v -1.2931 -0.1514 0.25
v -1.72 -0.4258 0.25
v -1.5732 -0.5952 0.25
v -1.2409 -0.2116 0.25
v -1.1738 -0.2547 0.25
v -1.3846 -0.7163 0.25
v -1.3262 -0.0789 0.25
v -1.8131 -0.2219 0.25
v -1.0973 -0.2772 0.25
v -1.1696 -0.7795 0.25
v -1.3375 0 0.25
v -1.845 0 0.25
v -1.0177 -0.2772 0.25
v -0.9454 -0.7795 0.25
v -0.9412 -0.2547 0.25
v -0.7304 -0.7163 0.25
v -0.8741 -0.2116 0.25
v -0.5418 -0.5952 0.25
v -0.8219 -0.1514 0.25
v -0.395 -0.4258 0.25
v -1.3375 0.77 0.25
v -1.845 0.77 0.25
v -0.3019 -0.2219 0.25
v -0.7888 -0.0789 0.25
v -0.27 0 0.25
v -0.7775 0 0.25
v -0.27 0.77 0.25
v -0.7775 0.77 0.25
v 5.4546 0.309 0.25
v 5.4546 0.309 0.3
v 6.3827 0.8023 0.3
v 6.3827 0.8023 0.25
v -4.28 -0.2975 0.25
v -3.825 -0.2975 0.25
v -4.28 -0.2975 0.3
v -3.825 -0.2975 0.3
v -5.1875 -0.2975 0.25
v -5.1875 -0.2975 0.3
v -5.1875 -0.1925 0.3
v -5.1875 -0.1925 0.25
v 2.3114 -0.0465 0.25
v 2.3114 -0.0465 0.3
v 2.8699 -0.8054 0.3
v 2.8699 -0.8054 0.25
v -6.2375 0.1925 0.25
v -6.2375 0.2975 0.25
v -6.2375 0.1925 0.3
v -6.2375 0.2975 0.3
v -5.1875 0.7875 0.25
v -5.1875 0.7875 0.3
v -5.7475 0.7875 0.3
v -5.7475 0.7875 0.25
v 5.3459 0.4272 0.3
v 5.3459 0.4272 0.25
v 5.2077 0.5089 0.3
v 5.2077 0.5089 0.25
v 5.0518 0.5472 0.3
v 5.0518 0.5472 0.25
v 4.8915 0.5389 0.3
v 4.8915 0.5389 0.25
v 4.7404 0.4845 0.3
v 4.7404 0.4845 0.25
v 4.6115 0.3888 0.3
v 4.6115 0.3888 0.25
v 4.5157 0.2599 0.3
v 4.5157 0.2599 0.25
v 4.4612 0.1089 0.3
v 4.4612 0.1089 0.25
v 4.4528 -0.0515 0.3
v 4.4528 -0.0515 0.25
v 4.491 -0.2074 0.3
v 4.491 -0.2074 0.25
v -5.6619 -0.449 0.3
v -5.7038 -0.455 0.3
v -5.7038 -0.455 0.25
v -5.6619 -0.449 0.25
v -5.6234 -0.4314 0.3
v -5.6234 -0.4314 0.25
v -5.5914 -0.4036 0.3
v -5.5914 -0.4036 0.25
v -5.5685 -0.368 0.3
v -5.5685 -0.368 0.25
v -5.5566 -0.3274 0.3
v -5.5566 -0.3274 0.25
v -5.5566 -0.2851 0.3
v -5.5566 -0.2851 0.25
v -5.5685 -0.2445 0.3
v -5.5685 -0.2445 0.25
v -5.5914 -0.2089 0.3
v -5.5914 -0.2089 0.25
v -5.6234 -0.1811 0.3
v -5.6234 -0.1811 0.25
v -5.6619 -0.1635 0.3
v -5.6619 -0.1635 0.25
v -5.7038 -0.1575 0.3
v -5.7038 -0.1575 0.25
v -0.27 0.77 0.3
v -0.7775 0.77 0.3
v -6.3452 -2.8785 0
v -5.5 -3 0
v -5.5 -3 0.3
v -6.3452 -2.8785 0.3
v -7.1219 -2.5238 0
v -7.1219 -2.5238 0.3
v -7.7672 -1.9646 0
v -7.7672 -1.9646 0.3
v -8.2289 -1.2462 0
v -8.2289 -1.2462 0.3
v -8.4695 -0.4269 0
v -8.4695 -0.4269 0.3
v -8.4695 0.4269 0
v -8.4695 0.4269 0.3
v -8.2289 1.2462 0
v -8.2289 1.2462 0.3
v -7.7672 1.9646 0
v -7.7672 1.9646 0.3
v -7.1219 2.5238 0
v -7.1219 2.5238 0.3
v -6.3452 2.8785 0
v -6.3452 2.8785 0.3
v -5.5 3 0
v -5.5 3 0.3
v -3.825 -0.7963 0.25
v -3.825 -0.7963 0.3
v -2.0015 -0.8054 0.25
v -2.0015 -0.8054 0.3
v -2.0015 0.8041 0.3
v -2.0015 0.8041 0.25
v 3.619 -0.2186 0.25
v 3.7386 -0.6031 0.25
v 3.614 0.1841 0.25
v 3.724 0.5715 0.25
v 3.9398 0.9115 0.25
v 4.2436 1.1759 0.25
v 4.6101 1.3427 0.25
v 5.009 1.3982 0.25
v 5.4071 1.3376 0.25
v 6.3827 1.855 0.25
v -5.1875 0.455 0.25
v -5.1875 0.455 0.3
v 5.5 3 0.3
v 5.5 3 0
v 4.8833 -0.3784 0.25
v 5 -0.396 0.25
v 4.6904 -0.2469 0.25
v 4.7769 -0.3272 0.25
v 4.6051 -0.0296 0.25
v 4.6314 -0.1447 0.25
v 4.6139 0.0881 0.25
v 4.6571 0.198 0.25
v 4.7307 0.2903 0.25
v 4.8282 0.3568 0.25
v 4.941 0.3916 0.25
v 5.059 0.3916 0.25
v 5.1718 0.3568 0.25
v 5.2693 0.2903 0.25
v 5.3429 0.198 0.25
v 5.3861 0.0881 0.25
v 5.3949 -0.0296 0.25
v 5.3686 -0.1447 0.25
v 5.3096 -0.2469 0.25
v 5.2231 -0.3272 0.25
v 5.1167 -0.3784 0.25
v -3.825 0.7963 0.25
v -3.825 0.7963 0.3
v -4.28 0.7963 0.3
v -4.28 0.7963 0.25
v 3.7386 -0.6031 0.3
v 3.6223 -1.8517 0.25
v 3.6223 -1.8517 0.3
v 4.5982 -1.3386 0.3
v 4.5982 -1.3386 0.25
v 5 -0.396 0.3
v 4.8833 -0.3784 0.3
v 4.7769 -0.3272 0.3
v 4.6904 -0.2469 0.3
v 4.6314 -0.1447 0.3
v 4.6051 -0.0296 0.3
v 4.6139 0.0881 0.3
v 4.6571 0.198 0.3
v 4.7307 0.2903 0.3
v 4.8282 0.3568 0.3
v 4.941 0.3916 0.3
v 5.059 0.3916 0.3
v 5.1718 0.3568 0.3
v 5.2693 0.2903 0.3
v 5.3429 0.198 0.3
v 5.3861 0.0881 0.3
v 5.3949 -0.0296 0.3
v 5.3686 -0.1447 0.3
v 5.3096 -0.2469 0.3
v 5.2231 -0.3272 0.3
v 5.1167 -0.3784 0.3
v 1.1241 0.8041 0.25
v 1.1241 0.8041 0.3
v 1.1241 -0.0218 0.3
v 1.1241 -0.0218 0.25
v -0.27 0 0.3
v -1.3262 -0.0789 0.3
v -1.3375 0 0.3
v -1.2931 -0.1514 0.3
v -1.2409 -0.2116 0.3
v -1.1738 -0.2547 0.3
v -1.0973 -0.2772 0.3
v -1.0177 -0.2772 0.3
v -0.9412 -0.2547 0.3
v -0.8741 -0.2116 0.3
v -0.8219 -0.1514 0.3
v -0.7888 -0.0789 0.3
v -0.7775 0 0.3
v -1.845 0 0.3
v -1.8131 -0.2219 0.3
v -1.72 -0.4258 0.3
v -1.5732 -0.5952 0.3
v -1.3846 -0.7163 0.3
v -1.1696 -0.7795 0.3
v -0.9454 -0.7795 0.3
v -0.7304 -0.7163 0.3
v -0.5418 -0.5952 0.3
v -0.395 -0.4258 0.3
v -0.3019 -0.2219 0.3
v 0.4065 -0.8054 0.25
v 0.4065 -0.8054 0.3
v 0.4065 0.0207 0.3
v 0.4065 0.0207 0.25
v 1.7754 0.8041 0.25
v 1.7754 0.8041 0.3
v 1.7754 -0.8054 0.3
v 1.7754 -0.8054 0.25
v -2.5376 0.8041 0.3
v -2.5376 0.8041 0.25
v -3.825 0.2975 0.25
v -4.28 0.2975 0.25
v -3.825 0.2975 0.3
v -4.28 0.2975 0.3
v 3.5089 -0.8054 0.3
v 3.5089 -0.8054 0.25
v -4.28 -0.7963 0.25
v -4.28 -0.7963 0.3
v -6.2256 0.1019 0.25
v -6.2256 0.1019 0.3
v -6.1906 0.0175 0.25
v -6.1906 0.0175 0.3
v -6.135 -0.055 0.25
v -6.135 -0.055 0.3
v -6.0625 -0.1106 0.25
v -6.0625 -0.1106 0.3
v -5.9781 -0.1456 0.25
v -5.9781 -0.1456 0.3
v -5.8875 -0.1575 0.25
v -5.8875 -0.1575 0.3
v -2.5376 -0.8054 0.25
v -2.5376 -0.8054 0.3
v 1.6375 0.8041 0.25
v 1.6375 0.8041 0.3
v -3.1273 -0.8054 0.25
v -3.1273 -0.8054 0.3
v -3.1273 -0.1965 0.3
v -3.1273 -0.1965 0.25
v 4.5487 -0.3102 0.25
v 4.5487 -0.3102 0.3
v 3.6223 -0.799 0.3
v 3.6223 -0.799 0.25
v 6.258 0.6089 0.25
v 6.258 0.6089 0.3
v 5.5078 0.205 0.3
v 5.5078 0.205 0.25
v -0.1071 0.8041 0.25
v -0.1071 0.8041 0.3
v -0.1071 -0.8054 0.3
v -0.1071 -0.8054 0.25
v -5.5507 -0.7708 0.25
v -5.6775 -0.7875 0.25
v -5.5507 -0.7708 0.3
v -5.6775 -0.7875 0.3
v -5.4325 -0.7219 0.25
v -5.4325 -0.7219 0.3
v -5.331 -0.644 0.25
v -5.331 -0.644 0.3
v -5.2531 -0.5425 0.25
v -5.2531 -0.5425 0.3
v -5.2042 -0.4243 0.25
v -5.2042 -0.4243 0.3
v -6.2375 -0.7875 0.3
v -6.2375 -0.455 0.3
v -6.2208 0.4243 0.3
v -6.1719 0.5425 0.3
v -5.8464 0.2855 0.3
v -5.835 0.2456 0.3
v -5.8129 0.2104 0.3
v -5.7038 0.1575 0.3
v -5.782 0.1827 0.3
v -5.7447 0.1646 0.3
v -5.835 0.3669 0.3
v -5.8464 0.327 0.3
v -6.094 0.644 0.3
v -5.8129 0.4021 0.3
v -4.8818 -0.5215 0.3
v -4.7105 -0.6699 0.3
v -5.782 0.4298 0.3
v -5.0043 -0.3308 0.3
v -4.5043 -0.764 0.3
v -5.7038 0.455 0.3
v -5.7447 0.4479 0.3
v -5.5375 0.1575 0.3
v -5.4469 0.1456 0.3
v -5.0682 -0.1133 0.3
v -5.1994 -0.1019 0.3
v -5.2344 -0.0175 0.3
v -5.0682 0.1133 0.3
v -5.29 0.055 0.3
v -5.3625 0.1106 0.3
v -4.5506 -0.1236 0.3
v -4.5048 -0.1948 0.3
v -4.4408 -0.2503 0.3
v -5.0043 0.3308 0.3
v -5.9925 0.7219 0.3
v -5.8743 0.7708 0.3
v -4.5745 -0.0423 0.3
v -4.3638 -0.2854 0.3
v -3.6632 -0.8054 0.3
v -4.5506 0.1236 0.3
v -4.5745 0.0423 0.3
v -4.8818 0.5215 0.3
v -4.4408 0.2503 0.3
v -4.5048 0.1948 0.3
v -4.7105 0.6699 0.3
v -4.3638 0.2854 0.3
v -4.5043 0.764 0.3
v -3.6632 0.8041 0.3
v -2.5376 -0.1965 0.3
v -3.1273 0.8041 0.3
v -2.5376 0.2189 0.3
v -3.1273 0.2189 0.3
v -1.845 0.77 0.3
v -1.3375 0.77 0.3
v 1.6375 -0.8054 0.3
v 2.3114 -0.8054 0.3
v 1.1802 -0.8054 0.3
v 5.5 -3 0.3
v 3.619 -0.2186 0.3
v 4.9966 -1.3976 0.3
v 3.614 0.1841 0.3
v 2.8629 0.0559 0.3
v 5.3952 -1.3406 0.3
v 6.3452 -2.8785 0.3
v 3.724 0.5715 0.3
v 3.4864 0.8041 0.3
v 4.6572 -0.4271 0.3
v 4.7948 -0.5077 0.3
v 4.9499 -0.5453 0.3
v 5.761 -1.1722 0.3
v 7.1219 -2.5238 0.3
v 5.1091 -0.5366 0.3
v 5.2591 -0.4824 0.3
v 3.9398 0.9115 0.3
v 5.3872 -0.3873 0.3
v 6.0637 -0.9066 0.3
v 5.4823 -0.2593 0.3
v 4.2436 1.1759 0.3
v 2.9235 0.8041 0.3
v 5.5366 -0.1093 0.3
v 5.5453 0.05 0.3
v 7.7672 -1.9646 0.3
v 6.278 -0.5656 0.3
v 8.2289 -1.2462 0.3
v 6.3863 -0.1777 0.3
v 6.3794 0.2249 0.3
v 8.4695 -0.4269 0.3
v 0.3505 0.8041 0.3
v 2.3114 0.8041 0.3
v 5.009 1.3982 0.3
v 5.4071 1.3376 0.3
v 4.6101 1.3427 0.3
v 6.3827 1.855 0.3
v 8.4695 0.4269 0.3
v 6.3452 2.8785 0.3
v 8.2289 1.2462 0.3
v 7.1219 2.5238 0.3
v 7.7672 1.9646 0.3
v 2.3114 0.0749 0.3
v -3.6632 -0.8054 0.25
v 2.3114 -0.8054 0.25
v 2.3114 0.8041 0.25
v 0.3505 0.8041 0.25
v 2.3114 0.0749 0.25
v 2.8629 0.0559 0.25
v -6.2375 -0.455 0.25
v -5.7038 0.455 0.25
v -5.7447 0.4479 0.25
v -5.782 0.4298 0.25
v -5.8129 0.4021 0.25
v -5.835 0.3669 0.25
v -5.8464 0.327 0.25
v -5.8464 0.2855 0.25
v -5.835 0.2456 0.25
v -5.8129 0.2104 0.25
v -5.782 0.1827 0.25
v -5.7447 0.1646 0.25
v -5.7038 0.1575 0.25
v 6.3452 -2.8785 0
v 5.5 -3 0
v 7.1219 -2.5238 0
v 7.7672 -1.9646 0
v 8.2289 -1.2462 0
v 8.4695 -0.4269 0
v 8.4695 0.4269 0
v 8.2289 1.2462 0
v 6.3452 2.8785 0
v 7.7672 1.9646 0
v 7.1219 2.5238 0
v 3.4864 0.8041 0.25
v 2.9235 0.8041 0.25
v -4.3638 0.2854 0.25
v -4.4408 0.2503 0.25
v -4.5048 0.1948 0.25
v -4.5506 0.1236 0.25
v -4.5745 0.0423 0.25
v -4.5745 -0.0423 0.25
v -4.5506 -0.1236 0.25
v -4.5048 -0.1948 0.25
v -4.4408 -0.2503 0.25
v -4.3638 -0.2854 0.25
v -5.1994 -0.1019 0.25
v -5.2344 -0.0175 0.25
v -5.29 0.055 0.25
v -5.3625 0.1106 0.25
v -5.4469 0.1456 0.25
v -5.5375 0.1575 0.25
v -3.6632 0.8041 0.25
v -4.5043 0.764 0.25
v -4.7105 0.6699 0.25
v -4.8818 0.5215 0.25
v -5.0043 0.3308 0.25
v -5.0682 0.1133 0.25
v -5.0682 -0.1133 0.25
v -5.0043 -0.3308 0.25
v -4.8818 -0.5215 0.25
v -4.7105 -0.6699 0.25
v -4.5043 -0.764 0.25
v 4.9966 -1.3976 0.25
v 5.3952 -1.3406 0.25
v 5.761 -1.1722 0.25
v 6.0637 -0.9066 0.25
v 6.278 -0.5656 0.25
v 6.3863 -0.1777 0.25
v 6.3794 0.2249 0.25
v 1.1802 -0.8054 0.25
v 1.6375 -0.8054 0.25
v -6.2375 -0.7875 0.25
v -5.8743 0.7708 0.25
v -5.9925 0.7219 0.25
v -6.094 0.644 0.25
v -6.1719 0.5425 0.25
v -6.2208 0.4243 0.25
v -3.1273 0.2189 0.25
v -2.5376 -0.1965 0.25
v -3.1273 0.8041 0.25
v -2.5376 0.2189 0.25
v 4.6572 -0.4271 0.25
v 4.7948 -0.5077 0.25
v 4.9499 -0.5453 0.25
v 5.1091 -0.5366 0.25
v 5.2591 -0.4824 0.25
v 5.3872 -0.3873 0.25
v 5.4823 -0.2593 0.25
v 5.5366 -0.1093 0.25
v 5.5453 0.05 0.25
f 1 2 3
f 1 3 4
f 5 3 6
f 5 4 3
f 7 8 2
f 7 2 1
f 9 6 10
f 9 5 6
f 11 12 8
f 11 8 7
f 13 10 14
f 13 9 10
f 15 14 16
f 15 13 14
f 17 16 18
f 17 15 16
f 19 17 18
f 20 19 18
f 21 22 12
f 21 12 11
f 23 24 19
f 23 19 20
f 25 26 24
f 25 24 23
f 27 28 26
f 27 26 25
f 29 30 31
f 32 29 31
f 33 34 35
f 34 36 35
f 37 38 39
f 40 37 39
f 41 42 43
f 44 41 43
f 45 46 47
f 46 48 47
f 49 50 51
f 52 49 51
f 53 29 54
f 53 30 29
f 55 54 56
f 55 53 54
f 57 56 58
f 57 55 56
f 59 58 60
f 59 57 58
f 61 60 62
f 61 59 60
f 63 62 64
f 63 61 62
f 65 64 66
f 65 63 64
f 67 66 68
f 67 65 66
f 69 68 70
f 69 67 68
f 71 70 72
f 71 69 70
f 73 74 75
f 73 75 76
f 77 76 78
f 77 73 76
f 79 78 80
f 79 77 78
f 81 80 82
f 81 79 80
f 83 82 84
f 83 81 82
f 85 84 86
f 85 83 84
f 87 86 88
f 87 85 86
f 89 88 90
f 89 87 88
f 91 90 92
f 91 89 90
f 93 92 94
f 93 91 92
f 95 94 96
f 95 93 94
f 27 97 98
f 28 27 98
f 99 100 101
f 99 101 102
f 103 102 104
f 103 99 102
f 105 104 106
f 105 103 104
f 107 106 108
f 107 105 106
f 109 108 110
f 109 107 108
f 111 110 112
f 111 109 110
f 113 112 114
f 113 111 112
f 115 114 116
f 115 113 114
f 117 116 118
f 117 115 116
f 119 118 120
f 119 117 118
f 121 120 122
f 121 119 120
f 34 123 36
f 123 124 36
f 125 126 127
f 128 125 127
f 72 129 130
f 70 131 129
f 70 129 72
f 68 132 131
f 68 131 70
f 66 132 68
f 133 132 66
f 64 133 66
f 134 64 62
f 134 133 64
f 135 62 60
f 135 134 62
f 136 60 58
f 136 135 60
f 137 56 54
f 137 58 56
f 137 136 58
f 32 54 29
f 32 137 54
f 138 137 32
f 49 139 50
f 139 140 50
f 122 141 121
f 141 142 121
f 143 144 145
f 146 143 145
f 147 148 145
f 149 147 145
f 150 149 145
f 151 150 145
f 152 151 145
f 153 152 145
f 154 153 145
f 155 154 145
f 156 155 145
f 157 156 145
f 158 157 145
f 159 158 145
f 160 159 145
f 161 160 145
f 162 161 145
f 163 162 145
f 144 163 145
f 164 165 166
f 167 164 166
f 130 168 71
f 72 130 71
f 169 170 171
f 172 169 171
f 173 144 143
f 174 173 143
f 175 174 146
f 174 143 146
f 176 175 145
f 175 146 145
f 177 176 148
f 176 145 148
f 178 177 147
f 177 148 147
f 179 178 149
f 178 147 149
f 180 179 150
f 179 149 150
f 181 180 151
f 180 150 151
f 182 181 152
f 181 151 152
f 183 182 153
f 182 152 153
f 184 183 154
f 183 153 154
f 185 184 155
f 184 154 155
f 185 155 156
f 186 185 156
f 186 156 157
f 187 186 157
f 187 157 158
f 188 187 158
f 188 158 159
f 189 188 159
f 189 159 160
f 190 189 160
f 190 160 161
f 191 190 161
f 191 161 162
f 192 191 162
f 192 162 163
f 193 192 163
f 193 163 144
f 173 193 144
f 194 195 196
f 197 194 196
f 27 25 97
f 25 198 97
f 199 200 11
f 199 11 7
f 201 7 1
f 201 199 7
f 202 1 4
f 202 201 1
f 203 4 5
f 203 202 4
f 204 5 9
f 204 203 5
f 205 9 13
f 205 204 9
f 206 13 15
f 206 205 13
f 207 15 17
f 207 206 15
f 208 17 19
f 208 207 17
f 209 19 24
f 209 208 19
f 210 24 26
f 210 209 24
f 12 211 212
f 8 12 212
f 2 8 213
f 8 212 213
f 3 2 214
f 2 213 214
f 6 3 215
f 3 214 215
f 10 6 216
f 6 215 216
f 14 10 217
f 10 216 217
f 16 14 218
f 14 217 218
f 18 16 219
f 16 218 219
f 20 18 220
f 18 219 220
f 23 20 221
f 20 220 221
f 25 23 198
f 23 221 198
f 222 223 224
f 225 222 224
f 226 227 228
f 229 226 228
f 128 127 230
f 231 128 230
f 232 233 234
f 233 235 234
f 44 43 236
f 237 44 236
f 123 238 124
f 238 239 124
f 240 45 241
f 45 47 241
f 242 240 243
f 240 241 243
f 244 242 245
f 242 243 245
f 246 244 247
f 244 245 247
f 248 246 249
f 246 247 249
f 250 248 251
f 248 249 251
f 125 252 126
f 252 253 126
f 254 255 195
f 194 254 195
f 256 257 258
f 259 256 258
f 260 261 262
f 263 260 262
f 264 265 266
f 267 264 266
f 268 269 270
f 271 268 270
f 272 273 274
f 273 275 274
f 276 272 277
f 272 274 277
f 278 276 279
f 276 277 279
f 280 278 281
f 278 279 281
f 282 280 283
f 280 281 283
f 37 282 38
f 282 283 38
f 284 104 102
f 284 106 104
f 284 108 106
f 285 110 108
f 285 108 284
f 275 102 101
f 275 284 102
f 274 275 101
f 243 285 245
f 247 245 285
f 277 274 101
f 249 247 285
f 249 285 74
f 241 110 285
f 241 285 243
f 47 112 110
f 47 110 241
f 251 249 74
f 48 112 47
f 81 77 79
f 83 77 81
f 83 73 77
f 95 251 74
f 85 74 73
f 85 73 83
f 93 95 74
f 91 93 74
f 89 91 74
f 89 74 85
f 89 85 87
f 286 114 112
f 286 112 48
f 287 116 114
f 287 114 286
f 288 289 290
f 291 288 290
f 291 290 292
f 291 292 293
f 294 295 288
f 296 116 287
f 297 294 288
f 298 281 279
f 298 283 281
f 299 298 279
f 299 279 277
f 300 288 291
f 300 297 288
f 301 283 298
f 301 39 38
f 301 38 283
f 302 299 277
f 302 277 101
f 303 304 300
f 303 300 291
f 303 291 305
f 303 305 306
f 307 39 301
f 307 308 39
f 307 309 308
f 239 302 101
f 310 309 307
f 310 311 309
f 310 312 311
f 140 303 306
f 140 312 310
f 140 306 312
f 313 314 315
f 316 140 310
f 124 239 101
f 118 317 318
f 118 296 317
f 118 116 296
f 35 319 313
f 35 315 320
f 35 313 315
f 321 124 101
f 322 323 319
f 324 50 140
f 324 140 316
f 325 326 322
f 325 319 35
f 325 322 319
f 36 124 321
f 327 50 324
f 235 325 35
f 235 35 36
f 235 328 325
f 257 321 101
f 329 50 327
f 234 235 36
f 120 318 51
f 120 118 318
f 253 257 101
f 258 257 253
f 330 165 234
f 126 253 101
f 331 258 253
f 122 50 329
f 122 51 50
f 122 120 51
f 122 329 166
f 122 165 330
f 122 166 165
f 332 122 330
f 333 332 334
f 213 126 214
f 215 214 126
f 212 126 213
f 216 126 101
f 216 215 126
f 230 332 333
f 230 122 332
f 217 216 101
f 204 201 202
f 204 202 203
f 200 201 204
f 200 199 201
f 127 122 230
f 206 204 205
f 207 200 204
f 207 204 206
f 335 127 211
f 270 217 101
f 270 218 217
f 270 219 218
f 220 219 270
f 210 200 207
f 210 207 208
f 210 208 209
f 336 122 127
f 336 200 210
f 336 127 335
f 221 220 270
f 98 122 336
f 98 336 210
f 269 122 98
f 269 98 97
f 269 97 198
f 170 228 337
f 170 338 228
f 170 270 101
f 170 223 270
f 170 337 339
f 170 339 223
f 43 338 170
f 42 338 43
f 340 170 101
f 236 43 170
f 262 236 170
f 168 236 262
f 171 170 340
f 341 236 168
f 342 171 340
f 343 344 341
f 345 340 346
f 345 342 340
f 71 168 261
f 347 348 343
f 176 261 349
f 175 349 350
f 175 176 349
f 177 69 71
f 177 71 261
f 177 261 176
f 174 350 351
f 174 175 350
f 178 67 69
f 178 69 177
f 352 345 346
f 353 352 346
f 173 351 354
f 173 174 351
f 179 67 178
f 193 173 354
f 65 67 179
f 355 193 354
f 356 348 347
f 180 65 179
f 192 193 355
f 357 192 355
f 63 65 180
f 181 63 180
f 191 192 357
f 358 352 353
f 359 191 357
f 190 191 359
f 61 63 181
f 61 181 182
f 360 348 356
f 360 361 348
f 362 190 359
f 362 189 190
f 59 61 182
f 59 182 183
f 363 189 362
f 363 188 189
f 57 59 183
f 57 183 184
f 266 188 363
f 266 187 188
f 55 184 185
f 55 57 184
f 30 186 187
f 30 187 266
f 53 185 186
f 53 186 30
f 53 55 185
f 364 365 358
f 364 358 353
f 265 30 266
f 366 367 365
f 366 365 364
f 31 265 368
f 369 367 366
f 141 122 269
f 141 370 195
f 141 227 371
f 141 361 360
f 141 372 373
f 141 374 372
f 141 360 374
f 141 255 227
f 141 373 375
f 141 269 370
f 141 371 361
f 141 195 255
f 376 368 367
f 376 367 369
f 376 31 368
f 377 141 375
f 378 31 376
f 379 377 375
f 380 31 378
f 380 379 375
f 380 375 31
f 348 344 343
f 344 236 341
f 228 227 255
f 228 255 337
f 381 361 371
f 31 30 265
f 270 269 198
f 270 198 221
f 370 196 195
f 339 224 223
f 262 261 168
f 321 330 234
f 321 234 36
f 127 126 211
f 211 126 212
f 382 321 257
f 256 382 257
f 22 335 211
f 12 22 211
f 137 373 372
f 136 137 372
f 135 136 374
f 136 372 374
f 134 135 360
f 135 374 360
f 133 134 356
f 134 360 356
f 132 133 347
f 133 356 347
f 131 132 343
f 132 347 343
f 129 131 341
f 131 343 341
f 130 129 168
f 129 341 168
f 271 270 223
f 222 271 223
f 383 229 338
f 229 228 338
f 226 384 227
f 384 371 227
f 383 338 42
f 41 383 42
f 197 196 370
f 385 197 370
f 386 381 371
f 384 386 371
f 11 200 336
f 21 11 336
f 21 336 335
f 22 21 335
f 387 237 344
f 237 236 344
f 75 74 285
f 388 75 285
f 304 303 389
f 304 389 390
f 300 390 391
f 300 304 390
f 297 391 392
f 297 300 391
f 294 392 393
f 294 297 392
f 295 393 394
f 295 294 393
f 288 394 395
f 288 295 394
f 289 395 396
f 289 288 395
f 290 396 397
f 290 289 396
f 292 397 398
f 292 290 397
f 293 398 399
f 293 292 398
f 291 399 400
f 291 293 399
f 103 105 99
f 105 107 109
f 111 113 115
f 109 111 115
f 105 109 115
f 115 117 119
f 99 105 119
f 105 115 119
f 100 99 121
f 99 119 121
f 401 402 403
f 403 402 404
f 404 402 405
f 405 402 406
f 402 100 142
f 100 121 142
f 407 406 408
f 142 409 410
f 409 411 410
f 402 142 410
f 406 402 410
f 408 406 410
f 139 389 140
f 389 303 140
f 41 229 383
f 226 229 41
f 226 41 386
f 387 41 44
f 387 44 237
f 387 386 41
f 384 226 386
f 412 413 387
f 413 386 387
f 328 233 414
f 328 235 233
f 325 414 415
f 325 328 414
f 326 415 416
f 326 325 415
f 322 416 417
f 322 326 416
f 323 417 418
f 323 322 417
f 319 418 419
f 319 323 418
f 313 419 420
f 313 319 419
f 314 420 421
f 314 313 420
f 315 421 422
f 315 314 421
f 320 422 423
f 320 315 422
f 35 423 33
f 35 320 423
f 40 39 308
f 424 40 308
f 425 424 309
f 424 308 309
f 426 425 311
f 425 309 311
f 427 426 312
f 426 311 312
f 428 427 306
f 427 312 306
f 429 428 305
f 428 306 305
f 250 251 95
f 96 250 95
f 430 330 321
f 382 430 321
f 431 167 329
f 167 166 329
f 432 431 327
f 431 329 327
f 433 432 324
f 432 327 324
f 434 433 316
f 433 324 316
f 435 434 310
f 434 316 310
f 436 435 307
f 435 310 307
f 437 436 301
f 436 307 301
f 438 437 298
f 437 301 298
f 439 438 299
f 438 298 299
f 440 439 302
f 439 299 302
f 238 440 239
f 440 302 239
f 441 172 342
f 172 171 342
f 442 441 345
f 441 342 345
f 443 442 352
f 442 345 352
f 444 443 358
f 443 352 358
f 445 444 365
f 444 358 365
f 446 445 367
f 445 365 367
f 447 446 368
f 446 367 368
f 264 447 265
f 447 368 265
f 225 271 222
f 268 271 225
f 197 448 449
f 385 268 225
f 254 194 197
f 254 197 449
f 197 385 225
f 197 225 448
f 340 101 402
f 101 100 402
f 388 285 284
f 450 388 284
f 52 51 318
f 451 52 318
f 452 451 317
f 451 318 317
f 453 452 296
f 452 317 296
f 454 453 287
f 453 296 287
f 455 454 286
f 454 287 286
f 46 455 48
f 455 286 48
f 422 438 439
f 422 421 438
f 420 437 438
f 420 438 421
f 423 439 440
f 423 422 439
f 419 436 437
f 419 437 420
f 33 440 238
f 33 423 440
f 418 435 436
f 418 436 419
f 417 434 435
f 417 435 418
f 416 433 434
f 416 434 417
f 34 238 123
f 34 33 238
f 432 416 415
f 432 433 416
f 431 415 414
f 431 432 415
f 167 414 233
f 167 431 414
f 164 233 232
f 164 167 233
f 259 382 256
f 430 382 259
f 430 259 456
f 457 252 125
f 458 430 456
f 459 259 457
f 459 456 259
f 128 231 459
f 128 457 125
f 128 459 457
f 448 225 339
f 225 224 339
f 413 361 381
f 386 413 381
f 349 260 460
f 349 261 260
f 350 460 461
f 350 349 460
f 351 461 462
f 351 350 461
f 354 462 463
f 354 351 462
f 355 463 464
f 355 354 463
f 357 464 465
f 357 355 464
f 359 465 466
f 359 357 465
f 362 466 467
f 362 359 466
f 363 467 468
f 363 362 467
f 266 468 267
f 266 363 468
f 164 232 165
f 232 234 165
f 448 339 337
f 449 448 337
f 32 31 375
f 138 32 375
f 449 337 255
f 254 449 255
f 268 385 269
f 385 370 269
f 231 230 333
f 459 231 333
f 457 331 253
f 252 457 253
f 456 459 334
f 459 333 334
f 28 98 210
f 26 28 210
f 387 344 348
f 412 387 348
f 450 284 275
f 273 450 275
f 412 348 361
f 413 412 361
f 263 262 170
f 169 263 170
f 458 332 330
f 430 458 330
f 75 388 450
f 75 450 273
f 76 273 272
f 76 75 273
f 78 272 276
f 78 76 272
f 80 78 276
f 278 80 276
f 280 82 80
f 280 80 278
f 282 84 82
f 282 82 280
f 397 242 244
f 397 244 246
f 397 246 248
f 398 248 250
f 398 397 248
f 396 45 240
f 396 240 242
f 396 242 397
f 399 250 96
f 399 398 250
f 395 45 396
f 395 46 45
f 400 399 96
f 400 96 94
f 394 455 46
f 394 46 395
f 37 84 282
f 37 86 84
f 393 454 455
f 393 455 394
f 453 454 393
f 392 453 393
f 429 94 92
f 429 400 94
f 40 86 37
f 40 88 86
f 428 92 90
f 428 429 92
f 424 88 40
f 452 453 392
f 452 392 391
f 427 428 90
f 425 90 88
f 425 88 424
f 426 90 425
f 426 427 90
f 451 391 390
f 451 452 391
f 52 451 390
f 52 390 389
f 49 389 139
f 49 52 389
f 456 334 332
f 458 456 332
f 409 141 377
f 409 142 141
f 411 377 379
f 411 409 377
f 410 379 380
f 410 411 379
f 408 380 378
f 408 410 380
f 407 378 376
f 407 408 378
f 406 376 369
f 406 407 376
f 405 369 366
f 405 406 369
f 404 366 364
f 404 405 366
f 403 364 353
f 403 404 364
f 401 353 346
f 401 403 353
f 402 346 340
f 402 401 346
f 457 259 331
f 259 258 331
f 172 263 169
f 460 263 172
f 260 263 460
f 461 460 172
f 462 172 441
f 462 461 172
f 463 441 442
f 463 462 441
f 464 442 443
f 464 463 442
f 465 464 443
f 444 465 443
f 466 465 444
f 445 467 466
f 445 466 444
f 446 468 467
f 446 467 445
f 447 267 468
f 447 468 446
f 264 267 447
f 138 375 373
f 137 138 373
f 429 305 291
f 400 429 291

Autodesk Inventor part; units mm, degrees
sketch "Sketch_1" plane through (0, 0, 0) normal (0, 0, 1) x (1, 0, 0)
  arc A0 (-8.5, 0) -> (-5.5, -3) centre (-5.5, 0) ccw
  line L0 (-5.5, -3) -> (5.5, -3)
  arc A1 (5.5, -3) -> (8.5, 0) centre (5.5, 0) ccw
  arc A2 (8.5, 0) -> (5.5, 3) centre (5.5, 0) ccw
  line L1 (5.5, 3) -> (-5.5, 3)
  arc A3 (-5.5, 3) -> (-8.5, 0) centre (-5.5, 0) ccw
extrude "Extrusion1" add sketch "Sketch_1" along normal blind 0.3
sketch "Sketch_13" plane through (0, 0, 0.3) normal (0, 0, 1) x (1, 0, 0)
  line L0 (-3.6632, 0.8041) -> (-3.6632, -0.8054)
  line L1 (-3.6632, -0.8054) -> (-3.1273, -0.8054)
  line L2 (-3.1273, -0.8054) -> (-3.1273, -0.1965)
  line L3 (-3.1273, -0.1965) -> (-2.5376, -0.1965)
  line L4 (-2.5376, -0.1965) -> (-2.5376, -0.8054)
  line L5 (-2.5376, -0.8054) -> (-2.0015, -0.8054)
  line L6 (-2.0015, -0.8054) -> (-2.0015, 0.8041)
  line L7 (-2.0015, 0.8041) -> (-2.5376, 0.8041)
  line L8 (-2.5376, 0.8041) -> (-2.5376, 0.2189)
  line L9 (-2.5376, 0.2189) -> (-3.1273, 0.2189)
  line L10 (-3.1273, 0.2189) -> (-3.1273, 0.8041)
  line L11 (-3.1273, 0.8041) -> (-3.6632, 0.8041)
extrude "Extrusion2" cut sketch "Sketch_13" against normal blind 0.05
sketch "Sketch_15" plane through (0, 0, 0.3) normal (0, 0, 1) x (1, 0, 0)
  line L0 (-0.1071, 0.8041) -> (-0.1071, -0.8054)
  line L1 (-0.1071, -0.8054) -> (0.4065, -0.8054)
  line L2 (0.4065, -0.8054) -> (0.4065, 0.0207)
  line L3 (0.4065, 0.0207) -> (1.1802, -0.8054)
  line L4 (1.1802, -0.8054) -> (1.6375, -0.8054)
  line L5 (1.6375, -0.8054) -> (1.6375, 0.8041)
  line L6 (1.6375, 0.8041) -> (1.1241, 0.8041)
  line L7 (1.1241, 0.8041) -> (1.1241, -0.0218)
  line L8 (1.1241, -0.0218) -> (0.3505, 0.8041)
  line L9 (0.3505, 0.8041) -> (-0.1071, 0.8041)
extrude "Extrusion3" cut sketch "Sketch_15" against normal blind 0.05
sketch "Sketch_16" plane through (0, 0, 0.3) normal (0, 0, 1) x (1, 0, 0)
  line L0 (1.7754, 0.8041) -> (1.7754, -0.8054)
  line L1 (1.7754, -0.8054) -> (2.3114, -0.8054)
  line L2 (2.3114, -0.8054) -> (2.3114, -0.0465)
  line L3 (2.3114, -0.0465) -> (2.8699, -0.8054)
  line L4 (2.8699, -0.8054) -> (3.5089, -0.8054)
  line L5 (3.5089, -0.8054) -> (2.8629, 0.0559)
  line L6 (2.8629, 0.0559) -> (3.4864, 0.8041)
  line L7 (3.4864, 0.8041) -> (2.9235, 0.8041)
  line L8 (2.9235, 0.8041) -> (2.3114, 0.0749)
  line L9 (2.3114, 0.0749) -> (2.3114, 0.8041)
  line L10 (2.3114, 0.8041) -> (1.7754, 0.8041)
extrude "Extrusion4" cut sketch "Sketch_16" against normal blind 0.05
sketch "Sketch_5" plane through (0, 0, 0.3) normal (0, 0, 1) x (1, 0, 0)
  arc A0 (-6.2375, 0.1925) -> (-5.8875, -0.1575) centre (-5.8875, 0.1925) ccw
  line L0 (-5.8875, -0.1575) -> (-5.7038, -0.1575)
  arc A1 (-5.7038, -0.455) -> (-5.7038, -0.1575) centre (-5.7038, -0.3063) ccw
  line L1 (-5.7038, -0.455) -> (-6.2375, -0.455)
  line L2 (-6.2375, -0.455) -> (-6.2375, -0.7875)
  line L3 (-6.2375, -0.7875) -> (-5.6775, -0.7875)
  arc A2 (-5.6775, -0.7875) -> (-5.1875, -0.2975) centre (-5.6775, -0.2975) ccw
  line L4 (-5.1875, -0.2975) -> (-5.1875, -0.1925)
  arc A3 (-5.1875, -0.1925) -> (-5.5375, 0.1575) centre (-5.5375, -0.1925) ccw
  line L5 (-5.5375, 0.1575) -> (-5.7038, 0.1575)
  arc A4 (-5.7038, 0.455) -> (-5.7038, 0.1575) centre (-5.6991, 0.3063) ccw
  line L6 (-5.7038, 0.455) -> (-5.1875, 0.455)
  line L7 (-5.1875, 0.455) -> (-5.1875, 0.7875)
  line L8 (-5.1875, 0.7875) -> (-5.7475, 0.7875)
  arc A5 (-5.7475, 0.7875) -> (-6.2375, 0.2975) centre (-5.7475, 0.2975) ccw
  line L9 (-6.2375, 0.2975) -> (-6.2375, 0.1925)
extrude "Extrusion5" cut sketch "Sketch_5" against normal blind 0.05
sketch "Sketch_6" plane through (0, 0, 0.3) normal (0, 0, 1) x (1, 0, 0)
  arc A0 (-4.28, 0.7963) -> (-4.28, -0.7963) centre (-4.28, 0) ccw
  line L0 (-4.28, -0.7963) -> (-3.825, -0.7963)
  line L1 (-3.825, -0.7963) -> (-3.825, -0.2975)
  line L2 (-3.825, -0.2975) -> (-4.28, -0.2975)
  arc A1 (-4.28, 0.2975) -> (-4.28, -0.2975) centre (-4.28, 0) ccw
  line L3 (-4.28, 0.2975) -> (-3.825, 0.2975)
  line L4 (-3.825, 0.2975) -> (-3.825, 0.7963)
  line L5 (-3.825, 0.7963) -> (-4.28, 0.7963)
extrude "Extrusion6" cut sketch "Sketch_6" against normal blind 0.05
sketch "Sketch_7" plane through (0, 0, 0.3) normal (0, 0, 1) x (1, 0, 0)
  line L0 (-1.845, 0.77) -> (-1.845, 0)
  arc A0 (-1.845, 0) -> (-0.27, 0) centre (-1.0575, 0) ccw
  line L1 (-0.27, 0) -> (-0.27, 0.77)
  line L2 (-0.27, 0.77) -> (-0.7775, 0.77)
  line L3 (-0.7775, 0.77) -> (-0.7775, 0)
  arc A1 (-1.3375, 0) -> (-0.7775, 0) centre (-1.0575, 0) ccw
  line L4 (-1.3375, 0) -> (-1.3375, 0.77)
  line L5 (-1.3375, 0.77) -> (-1.845, 0.77)
extrude "Extrusion7" cut sketch "Sketch_7" against normal blind 0.05
sketch "Sketch8" plane through (0, 0, 0.3) normal (0, 0, 1) x (1, 0, 0)
  point P0 (5, 0)
hole "Hole1" at (5, 0, 0.3) direction (0, 0, -1) diameter 0.792 depth 0.05
sketch "Sketch_3" plane through (0, 0, 0.3) normal (0, 0, 1) x (1, 0, 0)
  arc A0 (5.4071, 1.3376) -> (3.7386, -0.6031) centre (5, 0) ccw
  line L0 (3.7386, -0.6031) -> (4.491, -0.2074)
  arc A1 (5.4546, 0.309) -> (4.491, -0.2074) centre (5, 0) ccw
  line L1 (5.4546, 0.309) -> (6.3827, 0.8023)
  line L2 (6.3827, 0.8023) -> (6.3827, 1.855)
  line L3 (6.3827, 1.855) -> (5.4071, 1.3376)
extrude "Extrusion8" cut sketch "Sketch_3" against normal blind 0.05
sketch "Sketch_4" plane through (0, 0, 0.3) normal (0, 0, 1) x (1, 0, 0)
  line L0 (3.6223, -0.799) -> (3.6223, -1.8517)
  line L1 (3.6223, -1.8517) -> (4.5982, -1.3386)
  arc A0 (4.5982, -1.3386) -> (6.258, 0.6089) centre (5, 0) ccw
  line L2 (6.258, 0.6089) -> (5.5078, 0.205)
  arc A1 (4.5487, -0.3102) -> (5.5078, 0.205) centre (5, 0) ccw
  line L3 (4.5487, -0.3102) -> (3.6223, -0.799)
extrude "Extrusion9" cut sketch "Sketch_4" against normal blind 0.05
ref_plane "aluschild_XY" through (0, 0, 0) normal (0, 0, 1) x (1, 0, 0)
ref_plane "aluschild_YZ" through (0, 0, 0) normal (1, 0, 0) x (0, 1, 0)
ref_plane "aluschild_ZX" through (0, 0, 0) normal (0, 1, 0) x (0, 0, 1)
properties part number "SCHUNK-9954530 Typenschild 6x17x0.3"
